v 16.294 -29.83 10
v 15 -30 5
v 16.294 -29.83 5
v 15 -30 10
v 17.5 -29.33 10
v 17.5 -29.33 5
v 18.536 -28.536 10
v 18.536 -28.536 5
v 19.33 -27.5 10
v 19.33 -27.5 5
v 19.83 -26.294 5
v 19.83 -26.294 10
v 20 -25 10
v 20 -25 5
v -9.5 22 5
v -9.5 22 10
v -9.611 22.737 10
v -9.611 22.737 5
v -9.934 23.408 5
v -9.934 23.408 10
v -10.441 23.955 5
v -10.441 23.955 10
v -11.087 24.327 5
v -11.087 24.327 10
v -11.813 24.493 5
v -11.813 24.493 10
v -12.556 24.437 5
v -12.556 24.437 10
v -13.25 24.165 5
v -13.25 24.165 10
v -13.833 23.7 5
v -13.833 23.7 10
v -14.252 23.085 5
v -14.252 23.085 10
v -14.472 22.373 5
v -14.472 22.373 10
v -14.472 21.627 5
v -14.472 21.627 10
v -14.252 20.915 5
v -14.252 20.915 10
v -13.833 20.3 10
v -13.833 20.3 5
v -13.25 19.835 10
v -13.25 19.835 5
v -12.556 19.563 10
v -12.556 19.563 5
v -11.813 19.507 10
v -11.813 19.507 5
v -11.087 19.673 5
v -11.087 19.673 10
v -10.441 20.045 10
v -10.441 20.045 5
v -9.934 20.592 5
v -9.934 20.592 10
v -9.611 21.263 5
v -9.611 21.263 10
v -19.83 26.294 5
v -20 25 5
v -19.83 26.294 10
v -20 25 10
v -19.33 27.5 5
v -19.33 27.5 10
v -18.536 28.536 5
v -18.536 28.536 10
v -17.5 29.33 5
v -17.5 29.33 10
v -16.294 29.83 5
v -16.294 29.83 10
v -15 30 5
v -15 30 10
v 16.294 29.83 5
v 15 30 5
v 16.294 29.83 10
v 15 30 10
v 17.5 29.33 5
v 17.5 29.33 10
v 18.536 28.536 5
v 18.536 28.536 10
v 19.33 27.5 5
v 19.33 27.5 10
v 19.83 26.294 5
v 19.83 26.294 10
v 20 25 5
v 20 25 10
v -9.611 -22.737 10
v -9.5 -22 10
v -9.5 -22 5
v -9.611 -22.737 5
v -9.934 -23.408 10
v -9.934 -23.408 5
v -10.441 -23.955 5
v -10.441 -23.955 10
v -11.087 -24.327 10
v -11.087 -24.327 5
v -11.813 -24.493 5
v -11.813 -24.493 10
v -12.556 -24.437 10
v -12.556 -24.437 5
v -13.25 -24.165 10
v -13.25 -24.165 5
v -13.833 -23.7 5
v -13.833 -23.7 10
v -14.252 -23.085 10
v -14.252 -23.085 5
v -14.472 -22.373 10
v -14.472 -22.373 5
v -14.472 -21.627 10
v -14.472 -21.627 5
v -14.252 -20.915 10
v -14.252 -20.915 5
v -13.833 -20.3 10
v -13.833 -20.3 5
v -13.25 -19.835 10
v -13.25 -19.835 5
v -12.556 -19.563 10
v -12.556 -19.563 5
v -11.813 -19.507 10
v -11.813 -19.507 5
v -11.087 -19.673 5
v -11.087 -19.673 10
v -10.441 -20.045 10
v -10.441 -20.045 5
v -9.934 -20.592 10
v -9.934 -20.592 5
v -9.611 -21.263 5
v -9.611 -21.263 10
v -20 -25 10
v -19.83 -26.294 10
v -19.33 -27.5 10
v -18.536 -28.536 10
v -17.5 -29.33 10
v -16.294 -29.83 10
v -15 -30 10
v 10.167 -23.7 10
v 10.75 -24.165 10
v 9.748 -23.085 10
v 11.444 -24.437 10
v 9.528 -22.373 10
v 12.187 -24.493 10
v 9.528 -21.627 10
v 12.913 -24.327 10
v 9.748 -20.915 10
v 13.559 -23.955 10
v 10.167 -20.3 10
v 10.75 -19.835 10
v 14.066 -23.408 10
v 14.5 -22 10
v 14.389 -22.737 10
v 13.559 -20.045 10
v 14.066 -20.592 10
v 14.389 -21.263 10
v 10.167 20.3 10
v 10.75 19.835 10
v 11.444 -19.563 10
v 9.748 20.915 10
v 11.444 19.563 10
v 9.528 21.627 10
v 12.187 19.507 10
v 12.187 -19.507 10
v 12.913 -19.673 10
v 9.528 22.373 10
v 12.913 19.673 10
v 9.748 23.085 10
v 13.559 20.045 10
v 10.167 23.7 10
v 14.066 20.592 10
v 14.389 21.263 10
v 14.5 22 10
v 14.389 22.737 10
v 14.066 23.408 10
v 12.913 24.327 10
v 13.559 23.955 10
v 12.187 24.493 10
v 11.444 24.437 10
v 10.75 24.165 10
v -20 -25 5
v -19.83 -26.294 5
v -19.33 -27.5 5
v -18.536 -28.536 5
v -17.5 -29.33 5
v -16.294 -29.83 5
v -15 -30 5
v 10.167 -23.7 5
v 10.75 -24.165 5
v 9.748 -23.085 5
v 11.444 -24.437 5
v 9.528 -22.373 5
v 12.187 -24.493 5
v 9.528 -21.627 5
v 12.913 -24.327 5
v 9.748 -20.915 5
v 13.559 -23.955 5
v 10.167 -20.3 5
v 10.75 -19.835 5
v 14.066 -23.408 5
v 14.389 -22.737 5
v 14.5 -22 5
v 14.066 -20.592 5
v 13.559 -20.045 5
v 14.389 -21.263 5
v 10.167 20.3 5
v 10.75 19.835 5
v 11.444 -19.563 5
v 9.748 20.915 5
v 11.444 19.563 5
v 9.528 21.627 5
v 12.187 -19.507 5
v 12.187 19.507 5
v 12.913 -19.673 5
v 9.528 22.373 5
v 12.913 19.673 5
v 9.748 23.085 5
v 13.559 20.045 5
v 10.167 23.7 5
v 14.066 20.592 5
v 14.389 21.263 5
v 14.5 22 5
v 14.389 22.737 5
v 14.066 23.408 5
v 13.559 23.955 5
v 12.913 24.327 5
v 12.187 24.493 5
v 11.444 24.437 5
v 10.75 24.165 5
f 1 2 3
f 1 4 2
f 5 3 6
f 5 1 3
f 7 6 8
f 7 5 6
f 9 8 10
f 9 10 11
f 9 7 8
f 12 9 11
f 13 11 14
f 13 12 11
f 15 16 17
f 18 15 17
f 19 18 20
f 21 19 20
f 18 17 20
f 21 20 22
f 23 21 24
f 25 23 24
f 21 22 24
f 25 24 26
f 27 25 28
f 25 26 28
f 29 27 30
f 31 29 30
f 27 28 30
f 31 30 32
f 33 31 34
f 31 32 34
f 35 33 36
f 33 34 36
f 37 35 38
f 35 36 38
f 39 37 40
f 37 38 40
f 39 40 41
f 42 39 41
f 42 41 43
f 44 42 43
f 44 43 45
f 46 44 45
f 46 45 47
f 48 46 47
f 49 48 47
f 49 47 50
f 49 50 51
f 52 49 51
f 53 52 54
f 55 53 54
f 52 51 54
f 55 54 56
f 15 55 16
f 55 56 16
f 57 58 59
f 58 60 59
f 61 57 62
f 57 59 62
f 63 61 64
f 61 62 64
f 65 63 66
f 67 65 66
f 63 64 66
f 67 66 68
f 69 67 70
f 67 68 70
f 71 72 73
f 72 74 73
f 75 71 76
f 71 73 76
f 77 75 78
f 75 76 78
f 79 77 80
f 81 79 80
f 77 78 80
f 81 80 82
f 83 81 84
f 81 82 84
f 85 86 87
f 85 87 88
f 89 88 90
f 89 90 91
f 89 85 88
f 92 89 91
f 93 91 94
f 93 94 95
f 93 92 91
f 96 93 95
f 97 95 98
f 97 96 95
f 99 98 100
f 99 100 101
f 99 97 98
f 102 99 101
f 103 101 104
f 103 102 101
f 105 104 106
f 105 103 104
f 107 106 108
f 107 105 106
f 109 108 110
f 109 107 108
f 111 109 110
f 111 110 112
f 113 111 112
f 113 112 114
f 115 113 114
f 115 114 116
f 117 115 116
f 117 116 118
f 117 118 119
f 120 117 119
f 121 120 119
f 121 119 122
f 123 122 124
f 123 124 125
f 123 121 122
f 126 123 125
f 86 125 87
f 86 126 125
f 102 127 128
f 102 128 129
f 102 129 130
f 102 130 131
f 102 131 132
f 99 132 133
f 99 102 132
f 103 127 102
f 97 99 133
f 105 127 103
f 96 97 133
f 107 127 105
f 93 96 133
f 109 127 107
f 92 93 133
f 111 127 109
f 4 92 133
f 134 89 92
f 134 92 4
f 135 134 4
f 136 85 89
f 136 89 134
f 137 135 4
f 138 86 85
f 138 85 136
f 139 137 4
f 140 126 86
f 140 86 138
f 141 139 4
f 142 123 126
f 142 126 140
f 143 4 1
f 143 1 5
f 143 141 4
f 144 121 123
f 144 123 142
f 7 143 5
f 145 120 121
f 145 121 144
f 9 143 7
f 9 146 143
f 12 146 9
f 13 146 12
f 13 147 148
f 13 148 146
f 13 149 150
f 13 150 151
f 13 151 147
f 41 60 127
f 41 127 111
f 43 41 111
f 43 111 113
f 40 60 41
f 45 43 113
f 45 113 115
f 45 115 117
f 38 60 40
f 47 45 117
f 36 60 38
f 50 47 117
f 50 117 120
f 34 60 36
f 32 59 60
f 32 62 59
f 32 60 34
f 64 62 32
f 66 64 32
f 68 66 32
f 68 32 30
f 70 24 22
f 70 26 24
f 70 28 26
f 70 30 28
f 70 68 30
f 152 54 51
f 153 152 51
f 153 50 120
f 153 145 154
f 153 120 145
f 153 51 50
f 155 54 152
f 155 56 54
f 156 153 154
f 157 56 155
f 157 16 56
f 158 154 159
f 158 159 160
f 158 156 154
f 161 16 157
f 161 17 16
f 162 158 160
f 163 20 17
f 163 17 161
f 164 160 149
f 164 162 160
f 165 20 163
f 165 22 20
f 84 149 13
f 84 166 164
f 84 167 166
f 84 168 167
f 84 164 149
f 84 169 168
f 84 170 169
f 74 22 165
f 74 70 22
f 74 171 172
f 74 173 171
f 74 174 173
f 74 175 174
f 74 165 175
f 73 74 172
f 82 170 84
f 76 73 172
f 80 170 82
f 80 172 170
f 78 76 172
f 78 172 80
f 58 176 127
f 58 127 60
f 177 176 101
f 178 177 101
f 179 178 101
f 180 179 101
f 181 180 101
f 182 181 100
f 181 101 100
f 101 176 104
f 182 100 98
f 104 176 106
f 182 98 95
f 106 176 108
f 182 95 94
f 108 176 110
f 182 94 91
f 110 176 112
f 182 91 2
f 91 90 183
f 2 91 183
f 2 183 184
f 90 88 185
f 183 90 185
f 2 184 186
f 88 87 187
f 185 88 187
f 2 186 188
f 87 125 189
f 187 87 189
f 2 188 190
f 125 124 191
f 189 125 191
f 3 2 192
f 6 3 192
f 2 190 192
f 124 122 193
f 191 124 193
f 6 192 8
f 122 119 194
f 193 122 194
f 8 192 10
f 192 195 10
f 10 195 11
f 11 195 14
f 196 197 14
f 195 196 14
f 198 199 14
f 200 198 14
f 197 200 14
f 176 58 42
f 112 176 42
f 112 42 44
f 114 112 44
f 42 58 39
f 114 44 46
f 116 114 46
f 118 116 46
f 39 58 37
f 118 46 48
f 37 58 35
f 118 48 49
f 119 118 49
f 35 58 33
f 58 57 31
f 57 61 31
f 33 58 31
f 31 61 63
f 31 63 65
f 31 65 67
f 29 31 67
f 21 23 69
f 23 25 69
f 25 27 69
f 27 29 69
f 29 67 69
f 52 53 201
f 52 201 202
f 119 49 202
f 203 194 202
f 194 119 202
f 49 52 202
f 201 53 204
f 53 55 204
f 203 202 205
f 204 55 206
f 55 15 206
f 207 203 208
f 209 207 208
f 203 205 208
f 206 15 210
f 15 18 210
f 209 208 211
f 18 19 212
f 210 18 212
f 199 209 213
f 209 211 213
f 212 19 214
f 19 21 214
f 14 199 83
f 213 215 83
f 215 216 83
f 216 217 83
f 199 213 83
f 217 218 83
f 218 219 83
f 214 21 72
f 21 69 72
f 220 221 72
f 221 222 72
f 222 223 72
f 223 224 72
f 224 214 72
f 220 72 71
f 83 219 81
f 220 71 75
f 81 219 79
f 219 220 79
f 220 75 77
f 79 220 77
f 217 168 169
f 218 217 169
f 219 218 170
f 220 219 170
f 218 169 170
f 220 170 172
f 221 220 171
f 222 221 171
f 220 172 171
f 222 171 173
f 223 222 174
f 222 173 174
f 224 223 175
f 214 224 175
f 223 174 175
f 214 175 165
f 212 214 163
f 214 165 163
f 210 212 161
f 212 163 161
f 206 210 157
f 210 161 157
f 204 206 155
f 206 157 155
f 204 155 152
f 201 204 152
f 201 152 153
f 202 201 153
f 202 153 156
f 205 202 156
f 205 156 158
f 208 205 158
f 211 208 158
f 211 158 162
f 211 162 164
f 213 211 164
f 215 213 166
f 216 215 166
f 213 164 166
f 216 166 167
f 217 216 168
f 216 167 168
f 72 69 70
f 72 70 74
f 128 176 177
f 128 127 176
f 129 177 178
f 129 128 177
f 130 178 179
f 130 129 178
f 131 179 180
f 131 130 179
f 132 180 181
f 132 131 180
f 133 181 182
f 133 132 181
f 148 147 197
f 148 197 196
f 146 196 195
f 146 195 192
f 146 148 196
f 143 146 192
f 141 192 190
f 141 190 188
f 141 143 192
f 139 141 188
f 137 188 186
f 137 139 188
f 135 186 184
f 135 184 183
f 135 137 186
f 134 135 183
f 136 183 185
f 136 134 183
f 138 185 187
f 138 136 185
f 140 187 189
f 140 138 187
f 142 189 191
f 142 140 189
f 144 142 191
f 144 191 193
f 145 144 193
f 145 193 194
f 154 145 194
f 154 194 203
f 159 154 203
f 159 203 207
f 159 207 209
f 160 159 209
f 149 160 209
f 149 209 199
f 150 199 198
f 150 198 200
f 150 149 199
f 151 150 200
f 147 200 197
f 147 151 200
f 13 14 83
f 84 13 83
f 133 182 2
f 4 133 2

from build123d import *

# Parameters (mm, degrees)
SKETCH011_W     = 40
SKETCH011_H     = 60
PAD003_DEPTH    = 5
SKETCH017_R     = 2.5
POCKET009_DEPTH = 5
FILLET004_R     = 5


with BuildPart() as part:
    # Sketch011 → Pad003 (new body)
    with BuildSketch(Plane.XY):
        Rectangle(SKETCH011_W, SKETCH011_H)
    extrude(amount=PAD003_DEPTH)

    # Sketch017 (on Face6 of Pad003) → Pocket009 (cut)
    with BuildSketch(Plane.XY.offset(5)):
        with Locations((-12, 22)):
            Circle(SKETCH017_R)
        with Locations((12, 22)):
            Circle(SKETCH017_R)
    pocket009 = extrude(amount=-POCKET009_DEPTH, mode=Mode.SUBTRACT)

    # Mirrored001: Pocket009 across XZ
    add(pocket009.mirror(Plane.XZ), mode=Mode.SUBTRACT)

    # Fillet004
    fillet004_edges = [part.edges().sort_by_distance(p)[0] for p in [
        (20, 30, 2.5),
        (-20, 30, 2.5),
        (-20, -30, 2.5),
        (20, -30, 2.5),
    ]]
    fillet(fillet004_edges, radius=FILLET004_R)


with BuildPart() as part_1:
    # Body003 placement: moved
    add(part.part.moved(Location((0, 0, 5))))


solid = part_1.part
